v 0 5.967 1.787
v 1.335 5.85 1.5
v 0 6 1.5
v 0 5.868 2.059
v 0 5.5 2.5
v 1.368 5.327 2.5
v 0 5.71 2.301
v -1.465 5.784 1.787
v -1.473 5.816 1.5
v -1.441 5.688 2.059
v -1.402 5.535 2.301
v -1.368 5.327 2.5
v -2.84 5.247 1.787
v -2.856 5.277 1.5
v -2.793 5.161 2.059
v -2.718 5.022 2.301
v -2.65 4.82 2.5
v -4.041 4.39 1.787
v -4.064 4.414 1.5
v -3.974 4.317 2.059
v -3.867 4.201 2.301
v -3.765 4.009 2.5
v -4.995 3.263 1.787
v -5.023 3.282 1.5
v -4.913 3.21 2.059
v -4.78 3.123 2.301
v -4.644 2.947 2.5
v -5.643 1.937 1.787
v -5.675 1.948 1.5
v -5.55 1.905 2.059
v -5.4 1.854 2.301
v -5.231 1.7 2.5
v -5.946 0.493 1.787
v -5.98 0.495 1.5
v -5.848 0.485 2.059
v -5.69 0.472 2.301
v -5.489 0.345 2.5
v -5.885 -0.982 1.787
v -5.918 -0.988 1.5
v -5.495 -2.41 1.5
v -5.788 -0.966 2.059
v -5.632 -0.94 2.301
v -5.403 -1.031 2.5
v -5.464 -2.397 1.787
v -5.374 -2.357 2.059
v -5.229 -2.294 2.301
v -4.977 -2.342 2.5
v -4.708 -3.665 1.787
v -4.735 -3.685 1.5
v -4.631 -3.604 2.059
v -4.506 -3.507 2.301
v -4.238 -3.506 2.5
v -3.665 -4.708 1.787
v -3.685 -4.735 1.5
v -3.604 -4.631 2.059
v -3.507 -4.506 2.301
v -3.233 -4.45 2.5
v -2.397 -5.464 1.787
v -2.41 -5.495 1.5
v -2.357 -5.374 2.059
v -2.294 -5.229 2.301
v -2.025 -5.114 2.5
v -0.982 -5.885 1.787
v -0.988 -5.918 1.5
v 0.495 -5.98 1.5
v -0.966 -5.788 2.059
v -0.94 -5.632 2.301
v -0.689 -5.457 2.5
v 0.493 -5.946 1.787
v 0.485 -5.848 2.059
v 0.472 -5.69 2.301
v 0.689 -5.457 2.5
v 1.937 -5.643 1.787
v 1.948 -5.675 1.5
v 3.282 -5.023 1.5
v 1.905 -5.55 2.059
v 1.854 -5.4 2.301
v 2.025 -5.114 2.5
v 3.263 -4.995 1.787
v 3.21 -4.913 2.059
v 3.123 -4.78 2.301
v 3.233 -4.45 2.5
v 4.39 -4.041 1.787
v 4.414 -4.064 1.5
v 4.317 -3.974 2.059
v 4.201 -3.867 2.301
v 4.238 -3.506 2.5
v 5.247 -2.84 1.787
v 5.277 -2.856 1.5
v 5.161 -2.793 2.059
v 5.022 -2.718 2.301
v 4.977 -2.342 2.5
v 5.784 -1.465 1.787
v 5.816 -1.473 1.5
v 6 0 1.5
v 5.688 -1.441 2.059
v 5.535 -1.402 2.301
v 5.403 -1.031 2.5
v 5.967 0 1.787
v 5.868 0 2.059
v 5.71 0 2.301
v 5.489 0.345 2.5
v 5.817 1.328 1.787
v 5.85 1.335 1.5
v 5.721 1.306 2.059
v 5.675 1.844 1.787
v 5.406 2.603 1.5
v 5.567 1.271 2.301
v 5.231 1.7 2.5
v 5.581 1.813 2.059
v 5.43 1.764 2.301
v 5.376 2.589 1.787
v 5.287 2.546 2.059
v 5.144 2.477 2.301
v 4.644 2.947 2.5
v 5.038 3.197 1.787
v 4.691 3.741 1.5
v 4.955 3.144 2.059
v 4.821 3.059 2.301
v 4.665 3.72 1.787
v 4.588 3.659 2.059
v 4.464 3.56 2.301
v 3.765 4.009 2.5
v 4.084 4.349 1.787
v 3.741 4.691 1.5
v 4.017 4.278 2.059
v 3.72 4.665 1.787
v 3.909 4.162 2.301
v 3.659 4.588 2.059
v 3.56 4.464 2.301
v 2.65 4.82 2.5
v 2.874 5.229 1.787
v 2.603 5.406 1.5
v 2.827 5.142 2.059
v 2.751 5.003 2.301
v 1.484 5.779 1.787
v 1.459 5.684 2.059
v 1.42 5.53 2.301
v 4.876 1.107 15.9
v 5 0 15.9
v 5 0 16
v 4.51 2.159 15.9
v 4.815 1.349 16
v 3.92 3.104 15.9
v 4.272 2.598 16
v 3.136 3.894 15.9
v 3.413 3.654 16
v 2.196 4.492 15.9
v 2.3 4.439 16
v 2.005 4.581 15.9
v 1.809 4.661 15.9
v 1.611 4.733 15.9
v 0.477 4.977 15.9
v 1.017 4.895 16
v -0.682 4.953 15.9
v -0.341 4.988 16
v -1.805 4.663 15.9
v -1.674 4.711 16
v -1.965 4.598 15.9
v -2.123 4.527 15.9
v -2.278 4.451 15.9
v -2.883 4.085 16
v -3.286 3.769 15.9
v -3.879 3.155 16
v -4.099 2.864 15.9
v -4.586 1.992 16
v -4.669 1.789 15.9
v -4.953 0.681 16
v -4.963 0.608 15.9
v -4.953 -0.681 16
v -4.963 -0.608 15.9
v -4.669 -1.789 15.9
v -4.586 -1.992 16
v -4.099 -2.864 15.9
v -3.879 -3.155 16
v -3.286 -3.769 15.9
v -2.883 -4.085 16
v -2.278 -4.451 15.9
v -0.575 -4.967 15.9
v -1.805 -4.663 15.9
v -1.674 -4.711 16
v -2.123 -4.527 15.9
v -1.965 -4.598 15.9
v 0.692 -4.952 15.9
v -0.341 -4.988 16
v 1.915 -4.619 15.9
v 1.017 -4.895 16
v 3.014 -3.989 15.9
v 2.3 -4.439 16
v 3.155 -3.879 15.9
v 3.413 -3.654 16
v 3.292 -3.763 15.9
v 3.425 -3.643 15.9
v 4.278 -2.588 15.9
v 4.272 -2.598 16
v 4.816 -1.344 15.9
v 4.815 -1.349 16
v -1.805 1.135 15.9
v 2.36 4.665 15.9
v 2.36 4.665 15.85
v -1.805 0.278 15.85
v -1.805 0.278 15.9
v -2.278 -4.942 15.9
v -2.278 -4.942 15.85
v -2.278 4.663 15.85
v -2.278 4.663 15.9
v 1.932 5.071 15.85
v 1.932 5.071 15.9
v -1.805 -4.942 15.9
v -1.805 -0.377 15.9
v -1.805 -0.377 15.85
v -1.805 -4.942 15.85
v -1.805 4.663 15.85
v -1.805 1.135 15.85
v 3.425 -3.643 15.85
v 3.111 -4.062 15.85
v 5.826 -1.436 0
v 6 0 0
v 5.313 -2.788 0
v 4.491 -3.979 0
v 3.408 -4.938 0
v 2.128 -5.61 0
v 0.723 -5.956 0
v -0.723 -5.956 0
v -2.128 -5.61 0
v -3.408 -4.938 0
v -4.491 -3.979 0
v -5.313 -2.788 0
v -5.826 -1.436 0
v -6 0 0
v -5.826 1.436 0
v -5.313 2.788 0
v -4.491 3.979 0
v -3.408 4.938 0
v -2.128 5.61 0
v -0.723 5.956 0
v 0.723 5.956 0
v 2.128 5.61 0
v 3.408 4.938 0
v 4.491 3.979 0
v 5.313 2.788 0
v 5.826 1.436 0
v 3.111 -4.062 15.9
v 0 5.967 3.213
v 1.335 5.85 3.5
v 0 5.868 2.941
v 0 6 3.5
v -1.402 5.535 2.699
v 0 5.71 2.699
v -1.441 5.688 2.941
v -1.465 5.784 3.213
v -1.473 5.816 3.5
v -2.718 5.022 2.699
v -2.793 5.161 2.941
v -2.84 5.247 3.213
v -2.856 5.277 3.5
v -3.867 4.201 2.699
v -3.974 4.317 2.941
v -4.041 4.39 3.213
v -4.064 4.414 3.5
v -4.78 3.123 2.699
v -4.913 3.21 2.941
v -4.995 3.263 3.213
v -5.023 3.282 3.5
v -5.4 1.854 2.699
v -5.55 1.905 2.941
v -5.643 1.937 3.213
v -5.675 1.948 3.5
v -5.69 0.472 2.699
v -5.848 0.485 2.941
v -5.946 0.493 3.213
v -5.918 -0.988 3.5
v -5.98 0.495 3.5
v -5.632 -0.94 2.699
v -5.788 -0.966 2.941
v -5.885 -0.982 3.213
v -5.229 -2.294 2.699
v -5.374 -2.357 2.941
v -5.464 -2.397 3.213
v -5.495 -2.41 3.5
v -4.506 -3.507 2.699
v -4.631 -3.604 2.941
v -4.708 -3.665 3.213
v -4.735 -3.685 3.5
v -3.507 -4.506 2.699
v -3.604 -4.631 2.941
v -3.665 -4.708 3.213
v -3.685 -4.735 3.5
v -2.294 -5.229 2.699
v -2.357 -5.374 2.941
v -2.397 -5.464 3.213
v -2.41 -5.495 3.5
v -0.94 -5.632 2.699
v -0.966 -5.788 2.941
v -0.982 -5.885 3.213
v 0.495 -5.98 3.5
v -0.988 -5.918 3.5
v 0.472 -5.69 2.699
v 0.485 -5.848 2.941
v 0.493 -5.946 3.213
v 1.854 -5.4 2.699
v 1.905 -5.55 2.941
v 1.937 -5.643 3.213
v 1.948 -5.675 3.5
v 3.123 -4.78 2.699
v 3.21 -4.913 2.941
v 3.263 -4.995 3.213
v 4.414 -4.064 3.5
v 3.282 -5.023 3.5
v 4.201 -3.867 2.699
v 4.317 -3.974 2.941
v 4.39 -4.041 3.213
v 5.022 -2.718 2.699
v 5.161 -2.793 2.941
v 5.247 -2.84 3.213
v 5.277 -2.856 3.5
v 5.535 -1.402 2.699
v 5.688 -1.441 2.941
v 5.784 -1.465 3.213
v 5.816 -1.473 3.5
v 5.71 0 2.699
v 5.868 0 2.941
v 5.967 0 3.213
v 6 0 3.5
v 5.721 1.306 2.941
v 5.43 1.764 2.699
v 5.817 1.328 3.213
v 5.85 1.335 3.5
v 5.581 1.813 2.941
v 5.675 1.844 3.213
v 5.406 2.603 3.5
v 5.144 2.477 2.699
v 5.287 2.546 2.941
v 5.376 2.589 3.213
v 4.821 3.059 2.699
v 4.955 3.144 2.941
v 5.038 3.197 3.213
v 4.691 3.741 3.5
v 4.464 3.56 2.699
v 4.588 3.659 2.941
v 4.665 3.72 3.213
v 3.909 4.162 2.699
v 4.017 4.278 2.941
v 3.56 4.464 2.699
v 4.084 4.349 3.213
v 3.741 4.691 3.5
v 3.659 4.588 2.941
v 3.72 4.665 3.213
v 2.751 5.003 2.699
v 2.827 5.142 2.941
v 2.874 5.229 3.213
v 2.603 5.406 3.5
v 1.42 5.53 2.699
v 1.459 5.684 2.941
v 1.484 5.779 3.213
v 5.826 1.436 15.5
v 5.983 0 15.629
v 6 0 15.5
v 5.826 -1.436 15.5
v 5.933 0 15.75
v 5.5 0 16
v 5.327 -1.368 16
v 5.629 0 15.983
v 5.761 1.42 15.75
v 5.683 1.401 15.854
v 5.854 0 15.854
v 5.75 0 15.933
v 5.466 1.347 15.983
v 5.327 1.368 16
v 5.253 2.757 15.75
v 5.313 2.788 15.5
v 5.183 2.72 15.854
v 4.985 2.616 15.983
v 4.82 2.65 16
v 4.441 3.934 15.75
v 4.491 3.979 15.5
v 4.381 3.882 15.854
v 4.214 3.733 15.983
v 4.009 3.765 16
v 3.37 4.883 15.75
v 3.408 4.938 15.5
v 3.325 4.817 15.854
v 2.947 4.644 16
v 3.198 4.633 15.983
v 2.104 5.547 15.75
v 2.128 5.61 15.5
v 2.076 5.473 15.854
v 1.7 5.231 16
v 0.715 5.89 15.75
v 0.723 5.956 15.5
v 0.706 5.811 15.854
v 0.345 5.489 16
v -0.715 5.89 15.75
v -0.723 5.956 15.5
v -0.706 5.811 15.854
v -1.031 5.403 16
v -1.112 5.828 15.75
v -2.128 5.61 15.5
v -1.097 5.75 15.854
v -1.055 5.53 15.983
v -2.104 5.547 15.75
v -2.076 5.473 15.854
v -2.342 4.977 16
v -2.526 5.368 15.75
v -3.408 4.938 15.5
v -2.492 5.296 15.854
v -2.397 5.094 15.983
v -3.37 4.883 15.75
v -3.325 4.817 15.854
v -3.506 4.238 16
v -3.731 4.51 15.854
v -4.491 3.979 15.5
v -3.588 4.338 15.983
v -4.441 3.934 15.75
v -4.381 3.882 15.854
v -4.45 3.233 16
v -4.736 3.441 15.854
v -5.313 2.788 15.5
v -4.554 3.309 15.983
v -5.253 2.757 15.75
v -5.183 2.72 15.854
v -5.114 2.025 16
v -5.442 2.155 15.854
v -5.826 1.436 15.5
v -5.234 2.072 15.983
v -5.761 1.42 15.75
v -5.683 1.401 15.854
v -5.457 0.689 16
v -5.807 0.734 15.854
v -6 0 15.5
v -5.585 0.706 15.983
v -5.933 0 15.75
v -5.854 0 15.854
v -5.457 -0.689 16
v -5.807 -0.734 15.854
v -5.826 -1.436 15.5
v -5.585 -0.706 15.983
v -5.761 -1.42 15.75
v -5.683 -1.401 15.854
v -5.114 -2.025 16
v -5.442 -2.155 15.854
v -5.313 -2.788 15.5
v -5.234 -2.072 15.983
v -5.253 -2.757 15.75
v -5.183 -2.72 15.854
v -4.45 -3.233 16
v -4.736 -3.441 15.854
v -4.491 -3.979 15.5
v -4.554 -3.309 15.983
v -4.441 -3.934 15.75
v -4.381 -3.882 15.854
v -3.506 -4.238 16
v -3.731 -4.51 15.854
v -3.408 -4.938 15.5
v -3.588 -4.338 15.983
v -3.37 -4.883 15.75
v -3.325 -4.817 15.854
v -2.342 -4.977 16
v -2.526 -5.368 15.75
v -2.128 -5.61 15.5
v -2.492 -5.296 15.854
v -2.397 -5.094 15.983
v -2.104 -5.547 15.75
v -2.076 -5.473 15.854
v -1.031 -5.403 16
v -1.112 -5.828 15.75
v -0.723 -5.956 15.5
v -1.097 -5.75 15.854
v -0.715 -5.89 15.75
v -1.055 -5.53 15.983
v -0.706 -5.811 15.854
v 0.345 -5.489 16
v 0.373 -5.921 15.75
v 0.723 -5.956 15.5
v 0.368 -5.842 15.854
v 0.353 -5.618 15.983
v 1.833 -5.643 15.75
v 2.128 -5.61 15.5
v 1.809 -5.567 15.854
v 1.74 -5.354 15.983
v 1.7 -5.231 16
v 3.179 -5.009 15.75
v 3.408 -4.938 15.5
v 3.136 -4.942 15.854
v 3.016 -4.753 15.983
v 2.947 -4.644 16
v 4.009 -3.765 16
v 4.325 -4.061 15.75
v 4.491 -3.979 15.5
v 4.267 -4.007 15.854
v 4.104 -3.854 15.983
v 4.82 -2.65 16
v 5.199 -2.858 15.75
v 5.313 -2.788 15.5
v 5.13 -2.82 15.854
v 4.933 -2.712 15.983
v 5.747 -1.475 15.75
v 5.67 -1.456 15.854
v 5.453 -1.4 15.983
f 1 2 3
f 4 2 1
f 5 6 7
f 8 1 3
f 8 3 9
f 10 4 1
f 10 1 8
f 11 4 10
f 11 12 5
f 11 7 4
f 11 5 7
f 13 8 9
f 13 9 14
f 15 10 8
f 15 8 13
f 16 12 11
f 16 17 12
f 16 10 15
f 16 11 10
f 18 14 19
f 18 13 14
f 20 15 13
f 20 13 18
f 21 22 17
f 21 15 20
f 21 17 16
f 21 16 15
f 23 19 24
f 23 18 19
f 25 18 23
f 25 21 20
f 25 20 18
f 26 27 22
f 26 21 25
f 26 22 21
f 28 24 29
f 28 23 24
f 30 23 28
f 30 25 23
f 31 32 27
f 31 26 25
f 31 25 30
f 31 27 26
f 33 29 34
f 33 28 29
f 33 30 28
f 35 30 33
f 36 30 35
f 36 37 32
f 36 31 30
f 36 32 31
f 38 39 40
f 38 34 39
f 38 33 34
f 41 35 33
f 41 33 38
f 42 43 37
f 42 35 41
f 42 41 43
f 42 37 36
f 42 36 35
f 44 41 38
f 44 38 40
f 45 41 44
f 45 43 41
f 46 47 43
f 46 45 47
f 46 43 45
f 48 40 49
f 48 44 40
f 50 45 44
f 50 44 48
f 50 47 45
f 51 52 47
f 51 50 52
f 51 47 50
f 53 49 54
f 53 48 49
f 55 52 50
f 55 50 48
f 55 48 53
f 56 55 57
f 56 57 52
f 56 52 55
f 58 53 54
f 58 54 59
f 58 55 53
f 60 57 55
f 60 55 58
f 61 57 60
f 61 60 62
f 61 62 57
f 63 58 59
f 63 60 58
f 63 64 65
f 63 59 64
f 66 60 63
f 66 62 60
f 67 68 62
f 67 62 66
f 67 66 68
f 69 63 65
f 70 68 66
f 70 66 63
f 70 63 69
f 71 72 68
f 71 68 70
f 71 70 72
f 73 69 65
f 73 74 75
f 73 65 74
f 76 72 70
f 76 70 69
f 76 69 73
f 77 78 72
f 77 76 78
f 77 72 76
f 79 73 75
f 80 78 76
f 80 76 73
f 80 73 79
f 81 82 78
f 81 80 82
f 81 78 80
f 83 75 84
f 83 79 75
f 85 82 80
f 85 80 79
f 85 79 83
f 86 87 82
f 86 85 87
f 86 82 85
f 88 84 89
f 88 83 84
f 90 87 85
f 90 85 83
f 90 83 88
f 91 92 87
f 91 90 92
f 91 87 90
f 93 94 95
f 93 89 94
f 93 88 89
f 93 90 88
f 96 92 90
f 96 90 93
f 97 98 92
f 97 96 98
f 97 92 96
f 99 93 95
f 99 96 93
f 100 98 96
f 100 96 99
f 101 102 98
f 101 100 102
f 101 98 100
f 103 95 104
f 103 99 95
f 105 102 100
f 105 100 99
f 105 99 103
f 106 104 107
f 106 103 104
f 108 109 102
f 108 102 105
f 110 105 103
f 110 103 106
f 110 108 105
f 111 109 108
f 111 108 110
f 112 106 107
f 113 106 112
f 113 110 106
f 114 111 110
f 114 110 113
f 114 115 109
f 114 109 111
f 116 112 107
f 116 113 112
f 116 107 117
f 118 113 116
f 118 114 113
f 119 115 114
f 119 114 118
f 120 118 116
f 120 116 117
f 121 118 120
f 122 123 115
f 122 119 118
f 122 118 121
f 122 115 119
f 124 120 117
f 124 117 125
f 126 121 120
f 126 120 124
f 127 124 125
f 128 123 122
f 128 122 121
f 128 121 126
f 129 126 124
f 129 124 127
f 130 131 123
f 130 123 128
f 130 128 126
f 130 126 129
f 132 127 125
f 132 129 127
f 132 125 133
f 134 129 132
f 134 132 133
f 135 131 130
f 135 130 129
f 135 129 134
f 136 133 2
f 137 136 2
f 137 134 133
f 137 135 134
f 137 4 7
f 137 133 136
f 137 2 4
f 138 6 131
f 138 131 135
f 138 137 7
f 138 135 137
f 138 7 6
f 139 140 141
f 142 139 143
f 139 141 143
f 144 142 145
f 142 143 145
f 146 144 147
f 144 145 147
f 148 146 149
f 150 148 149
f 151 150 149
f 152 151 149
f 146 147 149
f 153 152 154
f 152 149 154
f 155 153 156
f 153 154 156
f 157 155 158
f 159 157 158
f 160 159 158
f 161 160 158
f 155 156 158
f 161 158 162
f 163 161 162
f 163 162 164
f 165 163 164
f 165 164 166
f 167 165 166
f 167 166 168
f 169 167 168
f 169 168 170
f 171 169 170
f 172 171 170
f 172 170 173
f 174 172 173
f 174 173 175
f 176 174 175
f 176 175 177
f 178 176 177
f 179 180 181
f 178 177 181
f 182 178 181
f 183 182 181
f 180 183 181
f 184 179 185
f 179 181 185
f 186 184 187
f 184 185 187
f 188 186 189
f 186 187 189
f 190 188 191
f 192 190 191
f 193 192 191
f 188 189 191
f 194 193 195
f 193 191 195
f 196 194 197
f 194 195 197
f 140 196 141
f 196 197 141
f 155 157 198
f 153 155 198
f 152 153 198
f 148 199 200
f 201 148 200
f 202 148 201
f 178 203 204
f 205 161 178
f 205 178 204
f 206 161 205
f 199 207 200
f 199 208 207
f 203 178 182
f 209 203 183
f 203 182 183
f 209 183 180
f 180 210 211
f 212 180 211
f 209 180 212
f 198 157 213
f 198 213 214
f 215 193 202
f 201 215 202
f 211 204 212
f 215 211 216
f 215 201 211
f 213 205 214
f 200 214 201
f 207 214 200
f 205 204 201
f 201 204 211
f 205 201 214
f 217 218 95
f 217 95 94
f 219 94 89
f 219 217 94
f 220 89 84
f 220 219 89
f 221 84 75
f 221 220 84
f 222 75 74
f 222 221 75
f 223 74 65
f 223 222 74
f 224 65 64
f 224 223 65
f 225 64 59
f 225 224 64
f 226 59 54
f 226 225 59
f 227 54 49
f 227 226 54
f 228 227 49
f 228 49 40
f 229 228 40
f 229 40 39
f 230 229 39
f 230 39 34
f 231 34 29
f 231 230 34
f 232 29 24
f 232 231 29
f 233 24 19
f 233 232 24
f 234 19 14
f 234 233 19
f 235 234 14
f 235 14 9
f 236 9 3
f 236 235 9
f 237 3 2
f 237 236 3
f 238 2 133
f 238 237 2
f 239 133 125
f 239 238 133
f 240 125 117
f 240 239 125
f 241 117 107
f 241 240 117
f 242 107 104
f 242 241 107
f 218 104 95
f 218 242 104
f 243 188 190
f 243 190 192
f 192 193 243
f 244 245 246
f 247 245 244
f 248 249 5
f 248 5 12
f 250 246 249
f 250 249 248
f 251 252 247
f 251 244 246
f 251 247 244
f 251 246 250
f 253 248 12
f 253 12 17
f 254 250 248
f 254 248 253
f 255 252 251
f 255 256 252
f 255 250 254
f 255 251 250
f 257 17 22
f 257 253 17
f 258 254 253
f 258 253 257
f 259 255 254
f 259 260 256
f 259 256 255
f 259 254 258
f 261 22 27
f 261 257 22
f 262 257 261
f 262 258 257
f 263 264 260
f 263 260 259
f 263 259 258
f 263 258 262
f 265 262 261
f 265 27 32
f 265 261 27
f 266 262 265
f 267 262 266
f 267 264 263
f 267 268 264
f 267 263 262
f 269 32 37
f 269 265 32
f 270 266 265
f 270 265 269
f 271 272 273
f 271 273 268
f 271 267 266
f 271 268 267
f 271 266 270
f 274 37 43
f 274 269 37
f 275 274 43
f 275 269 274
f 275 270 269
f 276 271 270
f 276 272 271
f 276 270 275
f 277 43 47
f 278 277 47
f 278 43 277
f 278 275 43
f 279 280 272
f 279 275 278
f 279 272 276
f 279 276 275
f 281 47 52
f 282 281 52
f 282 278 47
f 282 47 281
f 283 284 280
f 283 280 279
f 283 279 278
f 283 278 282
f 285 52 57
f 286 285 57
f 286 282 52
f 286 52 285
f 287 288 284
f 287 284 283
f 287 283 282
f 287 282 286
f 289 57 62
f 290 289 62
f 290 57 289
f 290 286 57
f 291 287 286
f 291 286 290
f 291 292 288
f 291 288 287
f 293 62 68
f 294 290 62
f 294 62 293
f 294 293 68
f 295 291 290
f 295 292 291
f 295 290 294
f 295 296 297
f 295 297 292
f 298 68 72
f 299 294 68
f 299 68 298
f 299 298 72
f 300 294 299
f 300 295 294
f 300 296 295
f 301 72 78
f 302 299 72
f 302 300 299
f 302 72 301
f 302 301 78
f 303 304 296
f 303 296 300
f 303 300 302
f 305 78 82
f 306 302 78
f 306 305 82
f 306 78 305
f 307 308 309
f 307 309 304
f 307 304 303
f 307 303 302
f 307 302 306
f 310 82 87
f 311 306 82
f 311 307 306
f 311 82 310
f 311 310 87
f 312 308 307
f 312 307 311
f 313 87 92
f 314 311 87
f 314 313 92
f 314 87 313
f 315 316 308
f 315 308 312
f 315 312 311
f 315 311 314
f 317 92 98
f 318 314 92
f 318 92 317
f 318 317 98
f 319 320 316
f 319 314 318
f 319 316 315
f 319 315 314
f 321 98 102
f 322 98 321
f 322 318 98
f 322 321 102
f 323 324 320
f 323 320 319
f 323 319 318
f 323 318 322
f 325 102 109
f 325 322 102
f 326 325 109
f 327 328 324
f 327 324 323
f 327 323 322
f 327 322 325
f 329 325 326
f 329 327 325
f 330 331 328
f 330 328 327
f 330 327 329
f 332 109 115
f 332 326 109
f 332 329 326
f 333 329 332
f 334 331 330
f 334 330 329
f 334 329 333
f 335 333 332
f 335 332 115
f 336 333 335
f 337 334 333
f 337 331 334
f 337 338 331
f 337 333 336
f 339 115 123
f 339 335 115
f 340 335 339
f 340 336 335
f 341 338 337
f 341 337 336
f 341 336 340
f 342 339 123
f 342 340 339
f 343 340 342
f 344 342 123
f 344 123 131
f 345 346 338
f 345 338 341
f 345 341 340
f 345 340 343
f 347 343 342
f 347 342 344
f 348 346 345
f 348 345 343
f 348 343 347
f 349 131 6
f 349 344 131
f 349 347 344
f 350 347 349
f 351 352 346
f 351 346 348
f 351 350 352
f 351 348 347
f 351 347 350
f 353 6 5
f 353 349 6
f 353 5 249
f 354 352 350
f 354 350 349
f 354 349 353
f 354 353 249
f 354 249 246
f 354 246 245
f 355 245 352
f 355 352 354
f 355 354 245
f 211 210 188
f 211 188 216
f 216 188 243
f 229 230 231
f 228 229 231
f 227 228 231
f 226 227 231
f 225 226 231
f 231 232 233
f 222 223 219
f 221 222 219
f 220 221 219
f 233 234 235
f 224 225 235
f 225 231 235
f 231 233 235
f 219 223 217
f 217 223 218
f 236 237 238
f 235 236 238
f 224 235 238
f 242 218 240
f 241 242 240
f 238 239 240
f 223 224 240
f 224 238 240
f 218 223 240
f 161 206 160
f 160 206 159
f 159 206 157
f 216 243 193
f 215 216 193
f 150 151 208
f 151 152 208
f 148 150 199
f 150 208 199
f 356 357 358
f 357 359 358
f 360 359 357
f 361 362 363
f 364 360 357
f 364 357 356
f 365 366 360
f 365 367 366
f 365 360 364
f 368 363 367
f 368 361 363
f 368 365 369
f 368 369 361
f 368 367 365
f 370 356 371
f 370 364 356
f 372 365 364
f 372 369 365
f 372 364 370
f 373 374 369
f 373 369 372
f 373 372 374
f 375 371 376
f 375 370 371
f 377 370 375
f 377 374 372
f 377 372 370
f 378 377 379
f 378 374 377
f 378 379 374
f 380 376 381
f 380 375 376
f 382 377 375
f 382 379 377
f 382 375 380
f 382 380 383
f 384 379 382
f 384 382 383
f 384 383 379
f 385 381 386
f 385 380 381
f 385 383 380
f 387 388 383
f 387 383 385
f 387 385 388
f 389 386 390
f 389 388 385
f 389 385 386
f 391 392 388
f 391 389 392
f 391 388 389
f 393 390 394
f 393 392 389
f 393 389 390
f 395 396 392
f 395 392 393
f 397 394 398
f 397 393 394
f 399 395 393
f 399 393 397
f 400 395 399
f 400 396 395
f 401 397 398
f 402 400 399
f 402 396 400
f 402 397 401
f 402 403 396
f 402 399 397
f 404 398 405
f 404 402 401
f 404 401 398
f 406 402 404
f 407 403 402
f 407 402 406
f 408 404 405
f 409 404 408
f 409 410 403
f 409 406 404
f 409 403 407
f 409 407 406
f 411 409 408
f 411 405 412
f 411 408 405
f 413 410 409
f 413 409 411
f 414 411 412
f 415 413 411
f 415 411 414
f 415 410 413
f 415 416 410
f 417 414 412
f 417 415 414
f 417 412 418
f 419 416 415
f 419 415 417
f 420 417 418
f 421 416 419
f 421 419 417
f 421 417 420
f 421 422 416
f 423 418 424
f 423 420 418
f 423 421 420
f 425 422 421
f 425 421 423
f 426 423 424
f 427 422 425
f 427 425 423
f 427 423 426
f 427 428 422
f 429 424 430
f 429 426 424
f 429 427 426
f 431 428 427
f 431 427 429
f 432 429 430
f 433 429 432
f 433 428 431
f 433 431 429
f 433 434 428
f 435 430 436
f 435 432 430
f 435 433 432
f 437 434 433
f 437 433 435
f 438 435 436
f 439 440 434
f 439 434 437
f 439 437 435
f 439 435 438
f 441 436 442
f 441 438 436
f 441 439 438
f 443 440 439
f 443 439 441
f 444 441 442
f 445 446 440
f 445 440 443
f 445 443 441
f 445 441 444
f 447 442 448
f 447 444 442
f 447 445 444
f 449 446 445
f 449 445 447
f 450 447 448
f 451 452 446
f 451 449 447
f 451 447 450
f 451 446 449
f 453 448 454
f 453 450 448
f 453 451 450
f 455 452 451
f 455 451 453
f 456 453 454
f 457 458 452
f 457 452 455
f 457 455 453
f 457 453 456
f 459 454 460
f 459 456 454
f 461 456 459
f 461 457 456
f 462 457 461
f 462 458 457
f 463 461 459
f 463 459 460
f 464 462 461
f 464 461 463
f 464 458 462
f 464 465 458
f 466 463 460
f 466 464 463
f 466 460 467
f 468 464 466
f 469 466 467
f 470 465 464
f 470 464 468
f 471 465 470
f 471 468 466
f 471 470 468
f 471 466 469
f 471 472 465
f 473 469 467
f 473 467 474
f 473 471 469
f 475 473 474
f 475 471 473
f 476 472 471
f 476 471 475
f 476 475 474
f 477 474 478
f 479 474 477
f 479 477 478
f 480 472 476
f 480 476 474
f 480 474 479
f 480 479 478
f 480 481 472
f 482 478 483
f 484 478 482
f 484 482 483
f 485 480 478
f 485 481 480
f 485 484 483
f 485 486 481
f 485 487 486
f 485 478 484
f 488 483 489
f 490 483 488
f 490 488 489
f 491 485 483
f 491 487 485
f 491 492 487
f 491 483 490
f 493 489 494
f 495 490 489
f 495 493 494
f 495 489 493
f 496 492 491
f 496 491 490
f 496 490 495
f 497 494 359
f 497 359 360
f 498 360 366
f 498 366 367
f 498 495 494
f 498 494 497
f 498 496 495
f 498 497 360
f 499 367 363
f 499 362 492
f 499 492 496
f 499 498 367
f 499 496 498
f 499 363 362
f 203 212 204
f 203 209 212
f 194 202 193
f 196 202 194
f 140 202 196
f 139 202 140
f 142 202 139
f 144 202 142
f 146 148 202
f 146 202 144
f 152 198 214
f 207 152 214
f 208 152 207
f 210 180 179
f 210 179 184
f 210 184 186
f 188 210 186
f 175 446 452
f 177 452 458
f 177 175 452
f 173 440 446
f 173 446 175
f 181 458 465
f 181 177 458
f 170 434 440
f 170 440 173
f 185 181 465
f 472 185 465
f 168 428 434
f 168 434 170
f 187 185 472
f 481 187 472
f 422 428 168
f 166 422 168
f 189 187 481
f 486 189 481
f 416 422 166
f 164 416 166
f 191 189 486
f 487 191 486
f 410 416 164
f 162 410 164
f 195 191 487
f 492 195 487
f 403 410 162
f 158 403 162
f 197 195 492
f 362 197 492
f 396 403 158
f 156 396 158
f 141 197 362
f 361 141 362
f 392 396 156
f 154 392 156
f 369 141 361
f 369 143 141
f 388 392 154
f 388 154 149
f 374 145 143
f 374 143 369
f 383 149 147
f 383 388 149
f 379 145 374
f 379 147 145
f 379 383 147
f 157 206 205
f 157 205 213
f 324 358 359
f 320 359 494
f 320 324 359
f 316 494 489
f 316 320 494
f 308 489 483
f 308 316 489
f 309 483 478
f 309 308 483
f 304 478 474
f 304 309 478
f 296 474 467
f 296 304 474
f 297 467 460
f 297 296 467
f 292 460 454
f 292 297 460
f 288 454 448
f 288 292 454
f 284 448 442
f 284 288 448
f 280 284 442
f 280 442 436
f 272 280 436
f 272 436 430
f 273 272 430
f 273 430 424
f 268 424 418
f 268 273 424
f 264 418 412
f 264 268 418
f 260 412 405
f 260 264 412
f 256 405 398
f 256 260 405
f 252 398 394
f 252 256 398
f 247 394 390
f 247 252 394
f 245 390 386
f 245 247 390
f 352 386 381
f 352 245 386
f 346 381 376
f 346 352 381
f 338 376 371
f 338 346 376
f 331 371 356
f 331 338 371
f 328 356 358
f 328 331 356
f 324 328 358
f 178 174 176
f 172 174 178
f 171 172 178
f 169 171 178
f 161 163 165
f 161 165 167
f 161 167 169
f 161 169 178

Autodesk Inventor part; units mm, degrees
ref_plane "YZ Plane" through (0, 0, 0) normal (1, 0, 0) x (0, 1, 0)
ref_plane "XZ Plane" through (0, 0, 0) normal (0, 1, 0) x (-1, 0, 0)
sketch "Sketch1" plane through (0, 0, 0) normal (0, 0, 1) x (1, 0, 0)
  line L0 (0, 9.6) -> (0, -7.2) construction
  line L1 (-7.2, 0) -> (9.6, 0) construction
  circle A0 centre (0, 0) radius 6
  dimension "d0" = 12
extrude "Extrusion1" add sketch "Sketch1" along normal blind 16
sketch "Sketch6" plane through (0, 0, 0) normal (1, 0, 0) x (0, 1, 0)
  line L0 (0, 20.8) -> (0, -1.6) projected
  line L1 (6, 0) -> (6, 16) projected
  line L2 (6, 3.5) -> (6, 1.5)
  line L3 (6, 2.5) -> (5.5, 2.5) construction
  line L4 (-6, 0) -> (6, 0) construction
  arc A0 (5.5, 2.5) -> (6, 3.5) centre (4.75, 3.5) ccw
  arc A1 (6, 1.5) -> (5.5, 2.5) centre (4.75, 1.5) ccw
  point P0 (0, 0)
  dimension "d16" = 2
  dimension "d17" = 2.5
  dimension "d18" = 0.5
revolve "Revolution1" cut sketch "Sketch6" angle 360 about axis through (0, 0, 0) along (0, 0, -1)
sketch "Sketch2" plane through (0, 0, 16) normal (0, 0, 1) x (1, 0, 0)
  circle A0 centre (0, 0) radius 6 projected
  circle A1 centre (0, 0) radius 5
  dimension "d3" = 1
extrude "Extrusion2" cut sketch "Sketch2" against normal blind 0.1 contours A1
sketch "Sketch3" plane through (0, 0, 15.9) normal (0, 0, 1) x (1, 0, 0)
  line L0 (-2.2779, 4.6629) -> (-1.8048, 4.6629)
  line L1 (-1.8048, 4.6629) -> (-1.8048, -4.9424)
  line L2 (-1.8048, -4.9424) -> (-2.2779, -4.9424)
  line L3 (-2.2779, -4.9424) -> (-2.2779, 4.6629)
  line L4 (-1.8048, 0.2777) -> (-2.233, 0.6841)
  line L5 (-2.233, 0.6841) -> (1.932, 5.0712)
  line L6 (1.932, 5.0712) -> (2.3602, 4.6648)
  line L7 (2.3602, 4.6648) -> (-1.8048, 0.2777)
  line L8 (-1.8048, 0.2777) -> (-2.1189, -0.1414)
  line L9 (-2.1189, -0.1414) -> (3.111, -4.0616)
  line L10 (3.111, -4.0616) -> (3.4251, -3.6426)
  line L11 (3.4251, -3.6426) -> (-1.8048, 0.2777)
  circle A0 centre (0, 0) radius 5 projected
extrude "Extrusion3" cut sketch "Sketch3" against normal blind 0.05 contours L0 A0 L3 | L1 L5 L4 L8 L9 A0 L3 | L5 A0 L7 L1 | L1 L4 L5 | L5 L6 L7 A0 | A0 L1 L2 L3 | L11 A0 L9 L1 | L1 L9 L8 | L10 L9 A0
fillet "Fillet1" radius 0.5 1 edges at (-6, 0, 16)
sketch "Sketch5" plane through (0, 0, 16) normal (0, 0, 1) x (1, 0, 0)
  circle A0 centre (0, 0) radius 5 projected
  circle A1 centre (0, 0) radius 6 projected
  line L0 (2, -4.5826) -> (2, -7)
  line L1 (2, -7) -> (-2, -7)
  line L2 (-2, -7) -> (-2, -4.5826)
  line L3 (0, -7.2) -> (0, 9.6) projected
  point P0 (0, -6)
  point P1 (0, -6)
  dimension "d12" = 1
  dimension "d13" = 4
split_face "Split1"
ref_plane "Work Plane1" through (10, 0, 0) normal (1, 0, 0) x (0, 1, 0)
properties part number "config - capasitor 3500 μF"
